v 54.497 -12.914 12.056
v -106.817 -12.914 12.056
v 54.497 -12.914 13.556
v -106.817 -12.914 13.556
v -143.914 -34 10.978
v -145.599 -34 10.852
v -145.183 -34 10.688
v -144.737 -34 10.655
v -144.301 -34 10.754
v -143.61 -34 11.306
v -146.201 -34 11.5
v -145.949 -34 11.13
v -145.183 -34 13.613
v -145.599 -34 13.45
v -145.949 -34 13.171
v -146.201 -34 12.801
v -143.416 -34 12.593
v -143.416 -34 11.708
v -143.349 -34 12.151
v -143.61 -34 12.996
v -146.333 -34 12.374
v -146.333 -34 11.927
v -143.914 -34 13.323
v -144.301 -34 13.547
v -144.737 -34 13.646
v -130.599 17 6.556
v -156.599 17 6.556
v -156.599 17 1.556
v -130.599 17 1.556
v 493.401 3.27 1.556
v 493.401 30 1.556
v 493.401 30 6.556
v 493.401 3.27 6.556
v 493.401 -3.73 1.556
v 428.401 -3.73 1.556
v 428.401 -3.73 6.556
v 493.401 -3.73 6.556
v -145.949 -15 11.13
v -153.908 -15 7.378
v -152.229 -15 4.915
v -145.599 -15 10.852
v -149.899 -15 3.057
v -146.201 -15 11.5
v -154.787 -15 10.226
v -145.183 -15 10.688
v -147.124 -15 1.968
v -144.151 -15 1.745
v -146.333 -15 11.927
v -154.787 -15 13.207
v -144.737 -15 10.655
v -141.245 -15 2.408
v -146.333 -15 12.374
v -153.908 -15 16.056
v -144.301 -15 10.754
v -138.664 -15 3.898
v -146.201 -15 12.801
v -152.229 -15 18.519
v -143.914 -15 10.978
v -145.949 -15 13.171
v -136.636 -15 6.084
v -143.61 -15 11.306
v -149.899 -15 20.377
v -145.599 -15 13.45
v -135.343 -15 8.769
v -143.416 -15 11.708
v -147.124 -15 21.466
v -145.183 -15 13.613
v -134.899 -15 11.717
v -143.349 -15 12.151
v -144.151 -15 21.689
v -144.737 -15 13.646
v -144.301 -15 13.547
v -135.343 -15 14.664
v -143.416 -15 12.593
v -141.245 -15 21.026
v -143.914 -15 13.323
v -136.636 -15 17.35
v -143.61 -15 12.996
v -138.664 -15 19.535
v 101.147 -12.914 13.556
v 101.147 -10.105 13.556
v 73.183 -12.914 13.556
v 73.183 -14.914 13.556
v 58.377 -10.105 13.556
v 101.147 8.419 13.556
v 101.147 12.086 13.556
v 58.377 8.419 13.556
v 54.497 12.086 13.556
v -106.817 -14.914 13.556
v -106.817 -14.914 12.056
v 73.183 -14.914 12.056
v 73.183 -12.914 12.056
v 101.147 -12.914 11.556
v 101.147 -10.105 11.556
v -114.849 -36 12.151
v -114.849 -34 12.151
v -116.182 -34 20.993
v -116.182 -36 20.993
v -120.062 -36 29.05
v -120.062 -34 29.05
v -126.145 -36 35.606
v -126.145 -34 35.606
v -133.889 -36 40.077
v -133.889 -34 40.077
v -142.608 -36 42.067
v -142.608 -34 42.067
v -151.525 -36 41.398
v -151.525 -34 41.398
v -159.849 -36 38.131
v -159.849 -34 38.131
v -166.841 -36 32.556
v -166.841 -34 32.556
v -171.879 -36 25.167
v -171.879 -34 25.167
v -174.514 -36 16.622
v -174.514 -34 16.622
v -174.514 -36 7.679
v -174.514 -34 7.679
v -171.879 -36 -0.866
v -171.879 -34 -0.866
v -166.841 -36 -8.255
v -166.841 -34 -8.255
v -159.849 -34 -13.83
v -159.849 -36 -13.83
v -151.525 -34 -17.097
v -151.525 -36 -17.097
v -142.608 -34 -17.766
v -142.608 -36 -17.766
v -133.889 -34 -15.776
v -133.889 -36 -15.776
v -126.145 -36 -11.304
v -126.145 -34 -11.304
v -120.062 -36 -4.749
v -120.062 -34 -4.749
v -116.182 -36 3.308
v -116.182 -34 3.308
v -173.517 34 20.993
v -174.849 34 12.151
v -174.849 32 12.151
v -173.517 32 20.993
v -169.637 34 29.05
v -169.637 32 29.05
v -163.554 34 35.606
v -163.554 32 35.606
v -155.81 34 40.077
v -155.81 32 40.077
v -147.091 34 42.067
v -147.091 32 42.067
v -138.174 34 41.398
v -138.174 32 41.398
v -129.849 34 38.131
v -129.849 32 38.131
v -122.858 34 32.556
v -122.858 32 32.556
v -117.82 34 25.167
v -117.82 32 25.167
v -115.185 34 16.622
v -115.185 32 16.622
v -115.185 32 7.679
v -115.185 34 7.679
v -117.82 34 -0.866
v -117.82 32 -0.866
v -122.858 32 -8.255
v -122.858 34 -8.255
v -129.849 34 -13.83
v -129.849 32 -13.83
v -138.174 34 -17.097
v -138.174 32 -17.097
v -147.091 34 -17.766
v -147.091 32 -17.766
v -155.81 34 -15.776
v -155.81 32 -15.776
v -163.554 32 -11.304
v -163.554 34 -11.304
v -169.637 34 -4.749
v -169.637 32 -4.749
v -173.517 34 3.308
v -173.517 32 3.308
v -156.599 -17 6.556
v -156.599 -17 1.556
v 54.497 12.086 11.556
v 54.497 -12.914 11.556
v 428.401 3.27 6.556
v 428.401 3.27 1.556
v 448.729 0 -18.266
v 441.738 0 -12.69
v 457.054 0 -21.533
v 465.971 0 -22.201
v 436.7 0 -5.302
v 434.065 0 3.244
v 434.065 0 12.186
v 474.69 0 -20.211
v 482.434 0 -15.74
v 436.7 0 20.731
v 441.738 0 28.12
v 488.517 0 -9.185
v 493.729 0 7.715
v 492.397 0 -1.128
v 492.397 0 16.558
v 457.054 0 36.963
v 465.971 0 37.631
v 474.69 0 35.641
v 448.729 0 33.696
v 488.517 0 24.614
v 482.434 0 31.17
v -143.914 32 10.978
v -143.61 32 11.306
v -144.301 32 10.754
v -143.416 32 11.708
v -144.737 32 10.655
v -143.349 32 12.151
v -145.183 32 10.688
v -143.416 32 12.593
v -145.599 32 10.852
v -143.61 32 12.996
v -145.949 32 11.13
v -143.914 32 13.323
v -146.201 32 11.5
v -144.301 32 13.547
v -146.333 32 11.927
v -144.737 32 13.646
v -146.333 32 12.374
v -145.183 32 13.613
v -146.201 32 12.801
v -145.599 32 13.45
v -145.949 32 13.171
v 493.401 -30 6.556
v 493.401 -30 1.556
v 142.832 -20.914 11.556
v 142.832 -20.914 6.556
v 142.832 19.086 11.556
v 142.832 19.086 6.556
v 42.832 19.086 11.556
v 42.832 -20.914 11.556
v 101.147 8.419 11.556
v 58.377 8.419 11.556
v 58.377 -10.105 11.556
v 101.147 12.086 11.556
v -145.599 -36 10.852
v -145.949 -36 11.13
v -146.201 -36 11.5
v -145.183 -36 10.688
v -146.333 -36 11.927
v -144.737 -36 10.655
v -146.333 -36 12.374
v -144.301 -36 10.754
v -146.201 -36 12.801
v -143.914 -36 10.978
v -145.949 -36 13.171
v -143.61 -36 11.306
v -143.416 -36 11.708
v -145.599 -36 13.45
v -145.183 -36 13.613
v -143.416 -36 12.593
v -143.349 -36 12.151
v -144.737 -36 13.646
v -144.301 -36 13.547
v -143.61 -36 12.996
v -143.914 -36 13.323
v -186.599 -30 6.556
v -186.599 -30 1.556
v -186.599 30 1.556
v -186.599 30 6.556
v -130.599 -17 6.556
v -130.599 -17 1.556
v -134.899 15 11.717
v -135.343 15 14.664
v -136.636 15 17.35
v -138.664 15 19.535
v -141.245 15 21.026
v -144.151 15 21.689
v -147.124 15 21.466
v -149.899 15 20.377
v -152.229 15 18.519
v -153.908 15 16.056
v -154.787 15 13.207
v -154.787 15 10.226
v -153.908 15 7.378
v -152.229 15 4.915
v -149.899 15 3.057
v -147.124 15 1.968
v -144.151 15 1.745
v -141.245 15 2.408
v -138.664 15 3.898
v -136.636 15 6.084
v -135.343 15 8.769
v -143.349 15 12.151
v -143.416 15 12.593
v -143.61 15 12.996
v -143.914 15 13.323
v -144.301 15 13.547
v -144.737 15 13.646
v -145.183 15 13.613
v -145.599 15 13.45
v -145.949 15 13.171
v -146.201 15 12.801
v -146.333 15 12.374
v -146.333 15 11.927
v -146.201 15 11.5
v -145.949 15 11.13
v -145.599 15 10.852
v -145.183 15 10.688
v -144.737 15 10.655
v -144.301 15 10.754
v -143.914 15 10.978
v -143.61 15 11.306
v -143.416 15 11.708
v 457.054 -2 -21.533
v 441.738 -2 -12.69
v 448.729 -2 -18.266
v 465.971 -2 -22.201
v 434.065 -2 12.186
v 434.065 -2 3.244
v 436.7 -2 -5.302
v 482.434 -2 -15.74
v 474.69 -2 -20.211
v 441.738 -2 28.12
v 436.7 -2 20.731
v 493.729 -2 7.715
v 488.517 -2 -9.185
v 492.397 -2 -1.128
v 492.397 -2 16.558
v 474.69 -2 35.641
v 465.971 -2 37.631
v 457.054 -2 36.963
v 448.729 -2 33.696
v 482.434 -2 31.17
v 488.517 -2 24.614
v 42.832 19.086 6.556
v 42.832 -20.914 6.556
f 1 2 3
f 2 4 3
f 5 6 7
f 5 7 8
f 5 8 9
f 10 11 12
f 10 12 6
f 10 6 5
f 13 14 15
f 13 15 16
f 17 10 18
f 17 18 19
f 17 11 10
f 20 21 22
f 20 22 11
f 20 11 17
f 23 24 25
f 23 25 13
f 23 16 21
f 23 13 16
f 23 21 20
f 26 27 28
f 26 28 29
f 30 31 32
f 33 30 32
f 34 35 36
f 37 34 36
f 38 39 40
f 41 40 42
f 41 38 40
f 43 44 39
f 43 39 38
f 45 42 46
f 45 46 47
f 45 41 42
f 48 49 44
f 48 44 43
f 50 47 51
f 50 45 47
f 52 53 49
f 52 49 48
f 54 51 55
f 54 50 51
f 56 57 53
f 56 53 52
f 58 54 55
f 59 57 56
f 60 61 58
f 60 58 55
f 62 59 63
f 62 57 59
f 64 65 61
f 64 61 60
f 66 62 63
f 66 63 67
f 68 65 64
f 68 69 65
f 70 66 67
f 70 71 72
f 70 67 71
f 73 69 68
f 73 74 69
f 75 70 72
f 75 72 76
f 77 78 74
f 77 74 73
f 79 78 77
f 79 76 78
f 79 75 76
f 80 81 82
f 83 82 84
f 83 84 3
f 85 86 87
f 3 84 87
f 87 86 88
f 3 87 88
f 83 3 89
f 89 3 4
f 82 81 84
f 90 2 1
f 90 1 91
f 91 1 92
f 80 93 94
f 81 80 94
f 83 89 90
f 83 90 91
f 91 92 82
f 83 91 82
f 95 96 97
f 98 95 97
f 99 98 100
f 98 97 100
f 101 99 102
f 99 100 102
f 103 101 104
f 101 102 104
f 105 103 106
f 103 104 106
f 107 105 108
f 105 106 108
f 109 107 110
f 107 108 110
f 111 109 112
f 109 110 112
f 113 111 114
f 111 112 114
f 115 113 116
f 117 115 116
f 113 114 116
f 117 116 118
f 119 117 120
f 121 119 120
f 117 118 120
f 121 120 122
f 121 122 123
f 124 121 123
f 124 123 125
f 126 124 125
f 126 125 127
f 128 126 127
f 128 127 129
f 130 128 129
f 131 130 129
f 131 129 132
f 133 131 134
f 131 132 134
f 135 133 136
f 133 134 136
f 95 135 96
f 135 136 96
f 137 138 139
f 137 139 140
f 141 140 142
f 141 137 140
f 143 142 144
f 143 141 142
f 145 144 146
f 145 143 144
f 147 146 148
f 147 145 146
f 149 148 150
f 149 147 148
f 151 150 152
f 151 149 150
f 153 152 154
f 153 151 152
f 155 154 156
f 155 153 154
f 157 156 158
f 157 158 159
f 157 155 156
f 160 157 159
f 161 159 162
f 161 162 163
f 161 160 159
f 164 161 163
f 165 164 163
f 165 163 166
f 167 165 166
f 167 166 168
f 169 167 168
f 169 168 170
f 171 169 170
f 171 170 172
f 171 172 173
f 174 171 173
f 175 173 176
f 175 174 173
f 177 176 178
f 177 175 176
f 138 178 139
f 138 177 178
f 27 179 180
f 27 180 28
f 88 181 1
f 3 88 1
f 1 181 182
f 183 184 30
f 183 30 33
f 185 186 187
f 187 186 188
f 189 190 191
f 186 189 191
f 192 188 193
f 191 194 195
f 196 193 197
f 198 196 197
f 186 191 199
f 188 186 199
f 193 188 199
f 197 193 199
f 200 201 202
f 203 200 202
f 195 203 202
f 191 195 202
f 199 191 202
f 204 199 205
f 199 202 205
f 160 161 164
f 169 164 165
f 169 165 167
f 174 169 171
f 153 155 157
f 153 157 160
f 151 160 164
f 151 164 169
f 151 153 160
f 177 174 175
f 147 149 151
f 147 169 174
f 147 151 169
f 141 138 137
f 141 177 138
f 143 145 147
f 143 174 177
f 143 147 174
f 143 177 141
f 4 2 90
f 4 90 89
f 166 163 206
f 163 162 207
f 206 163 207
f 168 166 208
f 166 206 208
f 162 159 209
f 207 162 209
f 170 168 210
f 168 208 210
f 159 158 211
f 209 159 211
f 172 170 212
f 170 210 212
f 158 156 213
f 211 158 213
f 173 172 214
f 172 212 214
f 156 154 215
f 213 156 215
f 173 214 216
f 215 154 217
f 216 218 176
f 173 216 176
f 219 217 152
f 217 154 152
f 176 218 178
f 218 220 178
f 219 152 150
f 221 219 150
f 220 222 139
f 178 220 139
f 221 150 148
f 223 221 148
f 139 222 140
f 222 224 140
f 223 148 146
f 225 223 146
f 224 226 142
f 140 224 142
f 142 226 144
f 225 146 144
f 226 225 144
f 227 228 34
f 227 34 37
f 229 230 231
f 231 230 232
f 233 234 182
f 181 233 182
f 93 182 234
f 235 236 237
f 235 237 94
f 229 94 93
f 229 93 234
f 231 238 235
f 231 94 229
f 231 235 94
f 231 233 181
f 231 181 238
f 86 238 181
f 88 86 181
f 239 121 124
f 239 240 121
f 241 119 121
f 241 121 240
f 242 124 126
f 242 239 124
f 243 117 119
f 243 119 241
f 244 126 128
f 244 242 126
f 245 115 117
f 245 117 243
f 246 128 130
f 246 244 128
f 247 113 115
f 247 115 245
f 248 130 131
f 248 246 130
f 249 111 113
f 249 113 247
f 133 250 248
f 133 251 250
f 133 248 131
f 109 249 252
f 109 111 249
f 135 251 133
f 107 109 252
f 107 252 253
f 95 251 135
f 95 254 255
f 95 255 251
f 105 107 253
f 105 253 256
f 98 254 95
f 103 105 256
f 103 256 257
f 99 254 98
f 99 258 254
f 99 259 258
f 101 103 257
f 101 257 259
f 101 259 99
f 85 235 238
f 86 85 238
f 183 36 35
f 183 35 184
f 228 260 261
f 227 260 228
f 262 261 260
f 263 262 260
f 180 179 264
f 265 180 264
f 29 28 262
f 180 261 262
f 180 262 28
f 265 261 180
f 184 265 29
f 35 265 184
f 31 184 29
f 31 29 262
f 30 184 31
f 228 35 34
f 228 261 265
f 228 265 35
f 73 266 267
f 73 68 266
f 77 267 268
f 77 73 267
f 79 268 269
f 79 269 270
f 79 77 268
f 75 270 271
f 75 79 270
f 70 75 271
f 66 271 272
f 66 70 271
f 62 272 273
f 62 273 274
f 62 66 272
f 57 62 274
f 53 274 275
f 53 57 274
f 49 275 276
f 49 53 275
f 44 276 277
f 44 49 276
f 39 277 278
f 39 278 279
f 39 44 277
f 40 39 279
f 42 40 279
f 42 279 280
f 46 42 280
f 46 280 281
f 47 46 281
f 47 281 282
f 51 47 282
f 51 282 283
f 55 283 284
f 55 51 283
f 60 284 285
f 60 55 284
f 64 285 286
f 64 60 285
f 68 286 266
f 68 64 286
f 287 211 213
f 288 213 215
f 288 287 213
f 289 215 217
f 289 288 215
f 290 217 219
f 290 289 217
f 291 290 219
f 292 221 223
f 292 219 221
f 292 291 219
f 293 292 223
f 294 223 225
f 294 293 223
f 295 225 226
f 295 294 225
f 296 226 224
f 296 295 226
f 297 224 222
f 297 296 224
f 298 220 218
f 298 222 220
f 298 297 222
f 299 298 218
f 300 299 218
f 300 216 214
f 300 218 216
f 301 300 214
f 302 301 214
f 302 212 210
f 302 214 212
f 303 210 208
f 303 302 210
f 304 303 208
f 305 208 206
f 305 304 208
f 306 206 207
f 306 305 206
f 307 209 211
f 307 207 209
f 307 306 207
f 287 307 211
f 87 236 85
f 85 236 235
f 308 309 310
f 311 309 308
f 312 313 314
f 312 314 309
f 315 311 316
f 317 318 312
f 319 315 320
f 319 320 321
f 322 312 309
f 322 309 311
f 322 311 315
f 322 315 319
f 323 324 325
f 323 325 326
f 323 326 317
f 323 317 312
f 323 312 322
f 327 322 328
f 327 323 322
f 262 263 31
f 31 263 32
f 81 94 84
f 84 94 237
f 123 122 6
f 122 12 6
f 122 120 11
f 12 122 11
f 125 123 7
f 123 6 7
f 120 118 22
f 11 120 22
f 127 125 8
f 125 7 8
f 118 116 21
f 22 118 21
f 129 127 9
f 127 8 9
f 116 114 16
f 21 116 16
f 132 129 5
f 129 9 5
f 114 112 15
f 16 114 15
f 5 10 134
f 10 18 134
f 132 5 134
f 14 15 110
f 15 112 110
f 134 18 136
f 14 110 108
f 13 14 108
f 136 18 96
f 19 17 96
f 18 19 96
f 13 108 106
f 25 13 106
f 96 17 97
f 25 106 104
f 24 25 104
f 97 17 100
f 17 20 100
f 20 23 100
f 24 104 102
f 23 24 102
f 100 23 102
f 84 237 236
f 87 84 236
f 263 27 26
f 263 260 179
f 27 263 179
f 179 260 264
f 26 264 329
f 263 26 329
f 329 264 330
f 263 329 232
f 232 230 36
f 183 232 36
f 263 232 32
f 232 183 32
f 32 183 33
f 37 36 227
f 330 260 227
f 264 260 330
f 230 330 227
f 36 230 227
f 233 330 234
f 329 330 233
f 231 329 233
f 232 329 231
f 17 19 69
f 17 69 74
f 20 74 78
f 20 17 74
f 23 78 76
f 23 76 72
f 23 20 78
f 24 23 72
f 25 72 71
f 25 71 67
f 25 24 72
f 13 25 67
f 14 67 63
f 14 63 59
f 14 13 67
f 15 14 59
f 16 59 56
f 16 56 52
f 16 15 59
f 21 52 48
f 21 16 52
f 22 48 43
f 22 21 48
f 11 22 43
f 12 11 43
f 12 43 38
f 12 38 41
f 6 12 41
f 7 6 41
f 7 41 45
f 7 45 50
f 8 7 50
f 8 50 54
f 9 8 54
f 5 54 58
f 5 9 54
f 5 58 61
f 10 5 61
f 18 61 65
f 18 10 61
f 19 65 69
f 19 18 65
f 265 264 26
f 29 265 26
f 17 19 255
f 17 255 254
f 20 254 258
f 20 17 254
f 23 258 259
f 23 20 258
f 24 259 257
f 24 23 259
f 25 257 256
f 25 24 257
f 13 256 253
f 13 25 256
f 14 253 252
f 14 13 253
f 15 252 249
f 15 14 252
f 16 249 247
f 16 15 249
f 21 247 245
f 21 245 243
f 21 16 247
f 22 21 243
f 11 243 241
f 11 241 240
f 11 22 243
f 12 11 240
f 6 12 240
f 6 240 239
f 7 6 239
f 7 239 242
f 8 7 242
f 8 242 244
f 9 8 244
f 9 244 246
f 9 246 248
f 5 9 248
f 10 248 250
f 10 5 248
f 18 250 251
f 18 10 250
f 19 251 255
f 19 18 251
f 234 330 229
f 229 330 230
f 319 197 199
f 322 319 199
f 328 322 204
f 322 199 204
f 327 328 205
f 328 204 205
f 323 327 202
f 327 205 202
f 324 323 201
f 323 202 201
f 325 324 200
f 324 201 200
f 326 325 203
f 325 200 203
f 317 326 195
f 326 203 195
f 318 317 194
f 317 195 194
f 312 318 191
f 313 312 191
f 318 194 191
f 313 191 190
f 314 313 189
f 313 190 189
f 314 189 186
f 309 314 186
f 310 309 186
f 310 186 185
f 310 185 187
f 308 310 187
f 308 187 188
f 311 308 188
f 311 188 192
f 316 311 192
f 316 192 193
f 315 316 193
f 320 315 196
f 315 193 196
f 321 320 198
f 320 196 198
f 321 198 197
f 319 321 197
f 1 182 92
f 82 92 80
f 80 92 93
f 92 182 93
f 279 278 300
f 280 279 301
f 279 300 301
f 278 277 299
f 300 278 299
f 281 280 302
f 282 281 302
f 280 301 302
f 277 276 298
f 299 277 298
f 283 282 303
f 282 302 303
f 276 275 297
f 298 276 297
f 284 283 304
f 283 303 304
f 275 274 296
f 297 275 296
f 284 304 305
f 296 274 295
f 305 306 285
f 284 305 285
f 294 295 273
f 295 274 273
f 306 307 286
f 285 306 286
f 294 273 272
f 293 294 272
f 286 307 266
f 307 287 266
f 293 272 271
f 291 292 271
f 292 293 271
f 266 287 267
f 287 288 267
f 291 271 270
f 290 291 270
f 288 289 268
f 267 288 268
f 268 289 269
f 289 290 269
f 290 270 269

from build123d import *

# Parameters (mm, degrees)
F0_W      = 680
F0_H      = 5
F1_DEPTH  = 30
F2_W      = 7
F2_H      = 5
F3_DEPTH  = 65
F4_W      = 26
F4_H      = 34
F5_DEPTH  = 25
F6_R      = 10
F7_DEPTH  = 15
F8_R      = 1.5
F9_DEPTH  = 34
F11_R     = 30
F11_R_2   = 1.5
F10_R     = 30
F10_R_2   = 1.5
F12_DEPTH = 2
F13_W     = 100
F13_H     = 40
F14_DEPTH = 5
F16_DEPTH = 2
F17_W     = 18.6858947465
F17_H     = 1.5
F17_W_2   = 161.3141052535
F18_DEPTH = 2
F19_R     = 30
F20_DEPTH = 2


with BuildPart() as f1:
    # F0 (on Front) → F1 (new body, symmetric)
    with BuildSketch(Plane.XZ):
        with Locations((153.4013146162, 4.0556881274)):
            Rectangle(F0_W, F0_H)
    extrude(amount=F1_DEPTH, both=True)

    # F2 (on face) → F3 (cut)
    with BuildSketch(Plane.YZ.offset(493.4013146162)):
        with Locations((-0.2302633282, 4.0556881274)):
            Rectangle(F2_W, F2_H)
    extrude(amount=-F3_DEPTH, mode=Mode.SUBTRACT)

    # F4 (on face) → F5 (cut)
    with BuildSketch(Plane.XY.offset(6.5556881274)):
        with Locations((-143.5986853838, 0)):
            Rectangle(F4_W, F4_H)
    extrude(amount=-F5_DEPTH, mode=Mode.SUBTRACT)

    # F13 (on face) → F14 (join)
    with BuildSketch(Plane.XY.offset(6.5556881274)):
        with Locations((92.8316880018, -0.9144100054)):
            Rectangle(F13_W, F13_H)
    extrude(amount=F14_DEPTH)

    # F15 (on face) → F16 (join)
    with BuildSketch(Plane.XY.offset(11.5556881274)):
        Polygon((101.1469349155, 12.0855899946), (54.497448366, 12.0855899946), (54.497448366, -12.9144100054), (101.1469349155, -12.9144100054), (101.1469349155, -10.1053658873), (58.3766587079, -10.1053658873), (58.3766587079, 8.4188915789), (101.1469349155, 8.4188915789), align=None)
    extrude(amount=F16_DEPTH)

    # F17 (on face) → F18 (join)
    with BuildSketch(Plane.XZ.offset(12.9144100054)):
        with Locations((63.8403957392, 12.8056881274)):
            Rectangle(F17_W, F17_H)
        with Locations((-26.1596042608, 12.8056881274)):
            Rectangle(F17_W_2, F17_H)
    extrude(amount=F18_DEPTH)


with BuildPart() as f7:
    # F6 (on Front) → F7 (new body, symmetric)
    with BuildSketch(Plane.XZ):
        with Locations((-144.8986679316, 11.7167849094)):
            Circle(F6_R)
    extrude(amount=F7_DEPTH, both=True)

    # F8 (on Front) → F9 (join, symmetric)
    with BuildSketch(Plane.XZ):
        with Locations((-144.8494642973, 12.1505782008)):
            Circle(F8_R)
    extrude(amount=F9_DEPTH, both=True)

    # F11 (on face) + F10 (on face) → F12 (join)
    with BuildSketch(Plane(origin=(0, 34, 0), x_dir=(-1, 0, 0), z_dir=(0, 1, 0))):
        with Locations((144.8494642973, 12.1505782008)):
            Circle(F11_R)
        with Locations((144.8494642973, 12.1505782008)):
            Circle(F11_R_2, mode=Mode.SUBTRACT)
    with BuildSketch(Plane.XZ.offset(34)):
        with Locations((-144.8494642973, 12.1505782008)):
            Circle(F10_R)
        with Locations((-144.8494642973, 12.1505782008)):
            Circle(F10_R_2, mode=Mode.SUBTRACT)
    extrude(amount=-F12_DEPTH, dir=(0, 1, 0))


with BuildPart() as f20:
    # F19 (on Front) → F20 (new body)
    with BuildSketch(Plane.XZ):
        with Locations((463.7294891083, 7.7148822207)):
            Circle(F19_R)
    extrude(amount=F20_DEPTH)


solid = Compound([f1.part, f7.part, f20.part])
